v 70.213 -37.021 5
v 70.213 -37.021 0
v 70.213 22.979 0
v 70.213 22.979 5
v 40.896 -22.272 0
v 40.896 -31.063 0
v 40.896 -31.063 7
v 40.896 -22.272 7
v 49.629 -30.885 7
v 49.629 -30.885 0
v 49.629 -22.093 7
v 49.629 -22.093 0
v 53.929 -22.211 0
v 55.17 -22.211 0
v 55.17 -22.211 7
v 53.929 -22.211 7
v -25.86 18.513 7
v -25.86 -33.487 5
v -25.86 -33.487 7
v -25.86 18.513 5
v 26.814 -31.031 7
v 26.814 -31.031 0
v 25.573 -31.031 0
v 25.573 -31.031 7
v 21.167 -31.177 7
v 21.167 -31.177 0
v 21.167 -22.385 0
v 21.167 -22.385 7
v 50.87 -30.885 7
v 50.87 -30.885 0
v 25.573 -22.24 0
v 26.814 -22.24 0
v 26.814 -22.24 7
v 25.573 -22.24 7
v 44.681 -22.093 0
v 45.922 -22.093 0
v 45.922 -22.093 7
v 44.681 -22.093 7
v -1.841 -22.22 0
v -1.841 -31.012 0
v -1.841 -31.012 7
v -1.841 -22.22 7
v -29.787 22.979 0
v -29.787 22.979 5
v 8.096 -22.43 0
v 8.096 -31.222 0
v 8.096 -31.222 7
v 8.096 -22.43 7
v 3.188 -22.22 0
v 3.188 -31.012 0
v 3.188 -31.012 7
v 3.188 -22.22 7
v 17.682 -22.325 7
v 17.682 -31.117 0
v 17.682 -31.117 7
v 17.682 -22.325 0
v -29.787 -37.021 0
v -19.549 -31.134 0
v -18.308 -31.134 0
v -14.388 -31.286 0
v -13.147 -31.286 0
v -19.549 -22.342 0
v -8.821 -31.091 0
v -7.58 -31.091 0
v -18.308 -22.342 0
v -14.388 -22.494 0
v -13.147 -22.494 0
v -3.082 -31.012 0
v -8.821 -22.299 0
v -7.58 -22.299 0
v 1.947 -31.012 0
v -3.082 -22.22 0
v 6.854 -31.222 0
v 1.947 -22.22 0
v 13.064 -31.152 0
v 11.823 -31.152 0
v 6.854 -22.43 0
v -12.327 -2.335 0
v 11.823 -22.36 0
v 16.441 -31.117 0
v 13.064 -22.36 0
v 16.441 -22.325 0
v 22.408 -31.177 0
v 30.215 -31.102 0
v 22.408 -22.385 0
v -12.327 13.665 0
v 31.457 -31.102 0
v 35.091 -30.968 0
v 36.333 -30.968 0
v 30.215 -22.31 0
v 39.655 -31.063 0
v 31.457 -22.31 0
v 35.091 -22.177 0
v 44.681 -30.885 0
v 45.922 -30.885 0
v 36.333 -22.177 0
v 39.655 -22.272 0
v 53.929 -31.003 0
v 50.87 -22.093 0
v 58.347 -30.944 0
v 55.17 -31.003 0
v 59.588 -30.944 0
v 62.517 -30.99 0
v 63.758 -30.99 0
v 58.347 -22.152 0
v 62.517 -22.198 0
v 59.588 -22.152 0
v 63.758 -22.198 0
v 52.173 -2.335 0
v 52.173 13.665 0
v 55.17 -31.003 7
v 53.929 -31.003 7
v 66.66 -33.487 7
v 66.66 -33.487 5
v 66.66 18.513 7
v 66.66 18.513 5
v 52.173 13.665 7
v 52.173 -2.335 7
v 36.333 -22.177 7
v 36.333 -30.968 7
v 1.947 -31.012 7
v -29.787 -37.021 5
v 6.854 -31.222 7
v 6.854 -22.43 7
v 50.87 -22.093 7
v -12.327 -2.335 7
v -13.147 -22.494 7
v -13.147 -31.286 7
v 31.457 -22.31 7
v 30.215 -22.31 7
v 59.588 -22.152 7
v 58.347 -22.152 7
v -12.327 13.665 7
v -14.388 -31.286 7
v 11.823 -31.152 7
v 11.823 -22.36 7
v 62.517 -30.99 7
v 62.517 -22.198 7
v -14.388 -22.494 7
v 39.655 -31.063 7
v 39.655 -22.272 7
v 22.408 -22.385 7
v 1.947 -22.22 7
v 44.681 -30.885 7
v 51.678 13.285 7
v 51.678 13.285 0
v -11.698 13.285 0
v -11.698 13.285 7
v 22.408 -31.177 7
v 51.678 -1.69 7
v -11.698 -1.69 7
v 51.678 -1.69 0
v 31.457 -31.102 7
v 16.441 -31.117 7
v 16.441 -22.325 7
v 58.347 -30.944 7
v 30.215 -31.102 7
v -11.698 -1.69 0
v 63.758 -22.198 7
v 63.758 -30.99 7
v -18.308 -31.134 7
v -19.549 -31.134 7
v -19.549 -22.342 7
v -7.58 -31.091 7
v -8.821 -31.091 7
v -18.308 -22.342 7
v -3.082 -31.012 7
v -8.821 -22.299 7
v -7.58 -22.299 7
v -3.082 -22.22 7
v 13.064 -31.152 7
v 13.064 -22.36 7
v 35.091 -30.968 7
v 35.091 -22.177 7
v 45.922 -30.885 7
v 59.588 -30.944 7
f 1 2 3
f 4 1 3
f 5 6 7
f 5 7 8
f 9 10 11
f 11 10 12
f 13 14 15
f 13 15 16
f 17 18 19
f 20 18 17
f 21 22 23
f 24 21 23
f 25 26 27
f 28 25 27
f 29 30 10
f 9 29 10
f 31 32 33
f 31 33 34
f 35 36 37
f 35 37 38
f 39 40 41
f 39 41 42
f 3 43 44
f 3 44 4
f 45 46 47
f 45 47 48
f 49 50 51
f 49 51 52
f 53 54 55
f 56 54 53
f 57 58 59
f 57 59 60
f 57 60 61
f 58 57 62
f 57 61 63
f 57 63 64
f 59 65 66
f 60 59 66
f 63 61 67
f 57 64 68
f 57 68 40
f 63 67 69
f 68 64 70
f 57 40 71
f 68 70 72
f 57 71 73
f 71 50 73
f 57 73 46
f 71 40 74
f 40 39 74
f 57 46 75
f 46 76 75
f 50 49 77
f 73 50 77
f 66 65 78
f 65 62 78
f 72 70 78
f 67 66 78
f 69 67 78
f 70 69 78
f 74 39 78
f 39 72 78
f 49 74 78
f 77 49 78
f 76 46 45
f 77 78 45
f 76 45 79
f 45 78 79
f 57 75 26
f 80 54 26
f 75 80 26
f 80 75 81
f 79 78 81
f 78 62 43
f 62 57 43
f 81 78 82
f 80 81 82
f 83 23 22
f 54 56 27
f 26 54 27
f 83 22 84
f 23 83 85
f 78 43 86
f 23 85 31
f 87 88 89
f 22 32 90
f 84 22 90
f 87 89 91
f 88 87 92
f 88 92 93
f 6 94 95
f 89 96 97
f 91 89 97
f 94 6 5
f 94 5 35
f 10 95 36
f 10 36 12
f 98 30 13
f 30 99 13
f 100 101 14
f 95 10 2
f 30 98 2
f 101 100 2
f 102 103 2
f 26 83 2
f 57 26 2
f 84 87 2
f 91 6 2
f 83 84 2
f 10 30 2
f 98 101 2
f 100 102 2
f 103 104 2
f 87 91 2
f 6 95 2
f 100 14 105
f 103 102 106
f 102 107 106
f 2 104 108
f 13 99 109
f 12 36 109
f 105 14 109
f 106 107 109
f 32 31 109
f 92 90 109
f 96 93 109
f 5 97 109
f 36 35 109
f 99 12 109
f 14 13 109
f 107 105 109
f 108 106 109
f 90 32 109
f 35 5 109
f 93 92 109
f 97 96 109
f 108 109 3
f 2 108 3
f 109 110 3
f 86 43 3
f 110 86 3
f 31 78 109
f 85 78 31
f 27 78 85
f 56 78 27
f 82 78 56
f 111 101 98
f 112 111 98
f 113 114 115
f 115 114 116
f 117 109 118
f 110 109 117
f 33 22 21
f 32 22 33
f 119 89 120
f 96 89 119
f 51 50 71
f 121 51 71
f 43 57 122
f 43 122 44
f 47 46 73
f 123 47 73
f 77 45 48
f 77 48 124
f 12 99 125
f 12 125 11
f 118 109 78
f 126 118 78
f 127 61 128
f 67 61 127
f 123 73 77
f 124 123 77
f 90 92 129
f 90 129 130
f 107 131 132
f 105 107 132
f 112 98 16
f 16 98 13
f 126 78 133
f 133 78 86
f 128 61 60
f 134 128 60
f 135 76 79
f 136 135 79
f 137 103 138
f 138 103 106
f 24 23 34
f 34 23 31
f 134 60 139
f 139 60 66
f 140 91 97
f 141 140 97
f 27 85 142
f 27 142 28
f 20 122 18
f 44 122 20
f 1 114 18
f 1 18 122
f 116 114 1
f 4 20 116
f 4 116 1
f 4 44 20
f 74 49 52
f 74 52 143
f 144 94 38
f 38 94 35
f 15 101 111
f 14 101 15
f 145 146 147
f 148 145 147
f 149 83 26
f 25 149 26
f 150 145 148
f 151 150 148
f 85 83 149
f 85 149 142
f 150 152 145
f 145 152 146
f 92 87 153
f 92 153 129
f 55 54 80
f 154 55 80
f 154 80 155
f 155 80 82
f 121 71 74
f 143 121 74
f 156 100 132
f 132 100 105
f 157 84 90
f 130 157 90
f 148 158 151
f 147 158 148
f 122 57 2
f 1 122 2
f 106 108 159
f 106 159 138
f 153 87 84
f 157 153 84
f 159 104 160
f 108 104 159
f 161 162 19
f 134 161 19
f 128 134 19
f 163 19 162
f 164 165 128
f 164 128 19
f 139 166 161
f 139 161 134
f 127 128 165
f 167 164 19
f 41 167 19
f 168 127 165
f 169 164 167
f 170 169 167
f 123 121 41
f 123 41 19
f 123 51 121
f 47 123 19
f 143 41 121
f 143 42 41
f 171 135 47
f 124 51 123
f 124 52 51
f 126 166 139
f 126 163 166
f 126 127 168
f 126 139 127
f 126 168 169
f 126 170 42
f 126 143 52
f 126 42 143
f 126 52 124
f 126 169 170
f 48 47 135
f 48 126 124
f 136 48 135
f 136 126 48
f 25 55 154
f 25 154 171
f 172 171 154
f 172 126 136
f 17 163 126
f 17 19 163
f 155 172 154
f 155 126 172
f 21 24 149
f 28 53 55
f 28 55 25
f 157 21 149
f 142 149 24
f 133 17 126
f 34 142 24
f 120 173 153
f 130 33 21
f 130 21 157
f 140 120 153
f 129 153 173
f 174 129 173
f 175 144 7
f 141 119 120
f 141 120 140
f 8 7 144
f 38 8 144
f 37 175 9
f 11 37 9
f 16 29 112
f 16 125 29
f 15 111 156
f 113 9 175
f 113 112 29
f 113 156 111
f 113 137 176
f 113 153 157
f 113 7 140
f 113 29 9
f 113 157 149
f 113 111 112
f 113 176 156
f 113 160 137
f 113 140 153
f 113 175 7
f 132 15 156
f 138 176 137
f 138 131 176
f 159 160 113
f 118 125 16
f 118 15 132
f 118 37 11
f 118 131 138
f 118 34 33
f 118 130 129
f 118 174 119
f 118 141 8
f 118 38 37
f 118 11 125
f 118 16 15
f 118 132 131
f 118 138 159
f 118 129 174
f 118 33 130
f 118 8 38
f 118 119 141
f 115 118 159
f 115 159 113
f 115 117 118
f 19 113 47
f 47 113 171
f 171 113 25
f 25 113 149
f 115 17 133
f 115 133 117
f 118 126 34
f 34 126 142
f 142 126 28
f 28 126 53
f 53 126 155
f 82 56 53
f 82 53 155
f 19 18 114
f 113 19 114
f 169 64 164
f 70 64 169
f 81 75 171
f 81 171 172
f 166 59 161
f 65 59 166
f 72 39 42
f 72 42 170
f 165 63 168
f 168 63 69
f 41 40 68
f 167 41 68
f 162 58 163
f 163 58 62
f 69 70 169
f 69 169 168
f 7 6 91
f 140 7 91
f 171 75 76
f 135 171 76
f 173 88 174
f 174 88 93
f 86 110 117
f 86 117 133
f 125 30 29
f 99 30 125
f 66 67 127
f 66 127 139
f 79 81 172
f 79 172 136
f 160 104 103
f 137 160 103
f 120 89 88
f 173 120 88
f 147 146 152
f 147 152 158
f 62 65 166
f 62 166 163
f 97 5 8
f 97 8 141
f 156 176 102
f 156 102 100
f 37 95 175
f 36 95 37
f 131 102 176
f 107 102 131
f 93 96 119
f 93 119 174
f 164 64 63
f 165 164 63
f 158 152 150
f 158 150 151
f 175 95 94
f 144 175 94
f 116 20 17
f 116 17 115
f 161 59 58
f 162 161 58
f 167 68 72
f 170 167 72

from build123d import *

# Parameters (mm, degrees)
SKETCH2_W           = 100
SKETCH2_H           = 60
BOSS_EXTRUDE1_DEPTH = 5
SKETCH3_W           = 92.52
SKETCH3_H           = 52
BOSS_EXTRUDE2_DEPTH = 2
SKETCH4_W           = 64.5
SKETCH4_H           = 16
CUT_EXTRUDE1_DEPTH  = 14
SKETCH5_W           = 1.24119343
SKETCH5_H           = 8.791786798
SKETCH5_W_2         = 1.241193431
SKETCH5_H_2         = 8.791786797
CUT_EXTRUDE2_DEPTH  = 14
SKETCH6_W           = 1.24119343
SKETCH6_H           = 8.791786798
SKETCH6_W_2         = 1.241193431
CUT_EXTRUDE3_DEPTH  = 14
SKETCH7_W           = 63.376055327
SKETCH7_H           = 14.974633453
BOSS_EXTRUDE8_DEPTH = 7


with BuildPart() as part:
    # Sketch2 → Boss-Extrude1 (new body)
    with BuildSketch(Plane.XY):
        with Locations((20.212765957, -7.021276596)):
            Rectangle(SKETCH2_W, SKETCH2_H)
    extrude(amount=BOSS_EXTRUDE1_DEPTH)

    # Sketch3 → Boss-Extrude2 (add)
    with BuildSketch(Plane.XY.offset(5)):
        with Locations((20.40011256, -7.487292221)):
            Rectangle(SKETCH3_W, SKETCH3_H)
    extrude(amount=BOSS_EXTRUDE2_DEPTH)

    # Sketch4 → Cut-Extrude1 (cut)
    with BuildSketch(Plane(origin=(0, 0, 0), x_dir=(-1, 0, 0), z_dir=(0, 0, -1))):
        with Locations((-19.923496788, 5.665280576)):
            Rectangle(SKETCH4_W, SKETCH4_H)
    extrude(amount=-CUT_EXTRUDE1_DEPTH, mode=Mode.SUBTRACT)

    # Sketch5 → Cut-Extrude2 (cut)
    with BuildSketch(Plane(origin=(0, 0, 0), x_dir=(-1, 0, 0), z_dir=(0, 0, -1))):
        with Locations((-58.967669826, -26.54783239)):
            Rectangle(SKETCH5_W, SKETCH5_H)
        with Locations((-63.137372089, -26.593640335)):
            Rectangle(SKETCH5_W_2, SKETCH5_H)
        with Locations((-54.549798109, -26.606737346)):
            Rectangle(SKETCH5_W_2, SKETCH5_H)
        with Locations((-50.249736303, -26.488927434)):
            Rectangle(SKETCH5_W, SKETCH5_H_2)
        with Locations((-45.301719979, -26.488927434)):
            Rectangle(SKETCH5_W, SKETCH5_H_2)
        with Locations((-40.275732606, -26.667494155)):
            Rectangle(SKETCH5_W, SKETCH5_H)
        with Locations((-35.712038447, -26.572417194)):
            Rectangle(SKETCH5_W, SKETCH5_H)
        with Locations((-30.835918022, -26.705630403)):
            Rectangle(SKETCH5_W_2, SKETCH5_H)
        with Locations((-26.193864427, -26.635405439)):
            Rectangle(SKETCH5_W, SKETCH5_H_2)
        with Locations((-21.787346613, -26.781075449)):
            Rectangle(SKETCH5_W, SKETCH5_H)
        with Locations((-17.061367018, -26.720926789)):
            Rectangle(SKETCH5_W_2, SKETCH5_H)
        with Locations((-12.443116631, -26.755913534)):
            Rectangle(SKETCH5_W_2, SKETCH5_H)
        with Locations((-7.47499879, -26.825887025)):
            Rectangle(SKETCH5_W, SKETCH5_H)
        with Locations((-2.567689738, -26.615966553)):
            Rectangle(SKETCH5_W_2, SKETCH5_H)
        with Locations((2.461236892, -26.615966553)):
            Rectangle(SKETCH5_W, SKETCH5_H)
        with Locations((8.200133962, -26.695073308)):
            Rectangle(SKETCH5_W_2, SKETCH5_H)
    extrude(amount=-CUT_EXTRUDE2_DEPTH, mode=Mode.SUBTRACT)

    # Sketch6 → Cut-Extrude3 (cut)
    with BuildSketch(Plane(origin=(0, 0, 0), x_dir=(-1, 0, 0), z_dir=(0, 0, -1))):
        with Locations((13.767615527, -26.890005841)):
            Rectangle(SKETCH6_W, SKETCH6_H)
        with Locations((18.928169849, -26.738087529)):
            Rectangle(SKETCH6_W_2, SKETCH6_H)
    extrude(amount=-CUT_EXTRUDE3_DEPTH, mode=Mode.SUBTRACT)


with BuildPart() as body_2:
    # Sketch7 → Boss-Extrude8 (new body)
    with BuildSketch(Plane(origin=(0, 0, 0), x_dir=(-1, 0, 0), z_dir=(0, 0, -1))):
        with Locations((-19.990265658, 5.79720755)):
            Rectangle(SKETCH7_W, SKETCH7_H)
    extrude(amount=-BOSS_EXTRUDE8_DEPTH)


solid = Compound([part.part, body_2.part])
